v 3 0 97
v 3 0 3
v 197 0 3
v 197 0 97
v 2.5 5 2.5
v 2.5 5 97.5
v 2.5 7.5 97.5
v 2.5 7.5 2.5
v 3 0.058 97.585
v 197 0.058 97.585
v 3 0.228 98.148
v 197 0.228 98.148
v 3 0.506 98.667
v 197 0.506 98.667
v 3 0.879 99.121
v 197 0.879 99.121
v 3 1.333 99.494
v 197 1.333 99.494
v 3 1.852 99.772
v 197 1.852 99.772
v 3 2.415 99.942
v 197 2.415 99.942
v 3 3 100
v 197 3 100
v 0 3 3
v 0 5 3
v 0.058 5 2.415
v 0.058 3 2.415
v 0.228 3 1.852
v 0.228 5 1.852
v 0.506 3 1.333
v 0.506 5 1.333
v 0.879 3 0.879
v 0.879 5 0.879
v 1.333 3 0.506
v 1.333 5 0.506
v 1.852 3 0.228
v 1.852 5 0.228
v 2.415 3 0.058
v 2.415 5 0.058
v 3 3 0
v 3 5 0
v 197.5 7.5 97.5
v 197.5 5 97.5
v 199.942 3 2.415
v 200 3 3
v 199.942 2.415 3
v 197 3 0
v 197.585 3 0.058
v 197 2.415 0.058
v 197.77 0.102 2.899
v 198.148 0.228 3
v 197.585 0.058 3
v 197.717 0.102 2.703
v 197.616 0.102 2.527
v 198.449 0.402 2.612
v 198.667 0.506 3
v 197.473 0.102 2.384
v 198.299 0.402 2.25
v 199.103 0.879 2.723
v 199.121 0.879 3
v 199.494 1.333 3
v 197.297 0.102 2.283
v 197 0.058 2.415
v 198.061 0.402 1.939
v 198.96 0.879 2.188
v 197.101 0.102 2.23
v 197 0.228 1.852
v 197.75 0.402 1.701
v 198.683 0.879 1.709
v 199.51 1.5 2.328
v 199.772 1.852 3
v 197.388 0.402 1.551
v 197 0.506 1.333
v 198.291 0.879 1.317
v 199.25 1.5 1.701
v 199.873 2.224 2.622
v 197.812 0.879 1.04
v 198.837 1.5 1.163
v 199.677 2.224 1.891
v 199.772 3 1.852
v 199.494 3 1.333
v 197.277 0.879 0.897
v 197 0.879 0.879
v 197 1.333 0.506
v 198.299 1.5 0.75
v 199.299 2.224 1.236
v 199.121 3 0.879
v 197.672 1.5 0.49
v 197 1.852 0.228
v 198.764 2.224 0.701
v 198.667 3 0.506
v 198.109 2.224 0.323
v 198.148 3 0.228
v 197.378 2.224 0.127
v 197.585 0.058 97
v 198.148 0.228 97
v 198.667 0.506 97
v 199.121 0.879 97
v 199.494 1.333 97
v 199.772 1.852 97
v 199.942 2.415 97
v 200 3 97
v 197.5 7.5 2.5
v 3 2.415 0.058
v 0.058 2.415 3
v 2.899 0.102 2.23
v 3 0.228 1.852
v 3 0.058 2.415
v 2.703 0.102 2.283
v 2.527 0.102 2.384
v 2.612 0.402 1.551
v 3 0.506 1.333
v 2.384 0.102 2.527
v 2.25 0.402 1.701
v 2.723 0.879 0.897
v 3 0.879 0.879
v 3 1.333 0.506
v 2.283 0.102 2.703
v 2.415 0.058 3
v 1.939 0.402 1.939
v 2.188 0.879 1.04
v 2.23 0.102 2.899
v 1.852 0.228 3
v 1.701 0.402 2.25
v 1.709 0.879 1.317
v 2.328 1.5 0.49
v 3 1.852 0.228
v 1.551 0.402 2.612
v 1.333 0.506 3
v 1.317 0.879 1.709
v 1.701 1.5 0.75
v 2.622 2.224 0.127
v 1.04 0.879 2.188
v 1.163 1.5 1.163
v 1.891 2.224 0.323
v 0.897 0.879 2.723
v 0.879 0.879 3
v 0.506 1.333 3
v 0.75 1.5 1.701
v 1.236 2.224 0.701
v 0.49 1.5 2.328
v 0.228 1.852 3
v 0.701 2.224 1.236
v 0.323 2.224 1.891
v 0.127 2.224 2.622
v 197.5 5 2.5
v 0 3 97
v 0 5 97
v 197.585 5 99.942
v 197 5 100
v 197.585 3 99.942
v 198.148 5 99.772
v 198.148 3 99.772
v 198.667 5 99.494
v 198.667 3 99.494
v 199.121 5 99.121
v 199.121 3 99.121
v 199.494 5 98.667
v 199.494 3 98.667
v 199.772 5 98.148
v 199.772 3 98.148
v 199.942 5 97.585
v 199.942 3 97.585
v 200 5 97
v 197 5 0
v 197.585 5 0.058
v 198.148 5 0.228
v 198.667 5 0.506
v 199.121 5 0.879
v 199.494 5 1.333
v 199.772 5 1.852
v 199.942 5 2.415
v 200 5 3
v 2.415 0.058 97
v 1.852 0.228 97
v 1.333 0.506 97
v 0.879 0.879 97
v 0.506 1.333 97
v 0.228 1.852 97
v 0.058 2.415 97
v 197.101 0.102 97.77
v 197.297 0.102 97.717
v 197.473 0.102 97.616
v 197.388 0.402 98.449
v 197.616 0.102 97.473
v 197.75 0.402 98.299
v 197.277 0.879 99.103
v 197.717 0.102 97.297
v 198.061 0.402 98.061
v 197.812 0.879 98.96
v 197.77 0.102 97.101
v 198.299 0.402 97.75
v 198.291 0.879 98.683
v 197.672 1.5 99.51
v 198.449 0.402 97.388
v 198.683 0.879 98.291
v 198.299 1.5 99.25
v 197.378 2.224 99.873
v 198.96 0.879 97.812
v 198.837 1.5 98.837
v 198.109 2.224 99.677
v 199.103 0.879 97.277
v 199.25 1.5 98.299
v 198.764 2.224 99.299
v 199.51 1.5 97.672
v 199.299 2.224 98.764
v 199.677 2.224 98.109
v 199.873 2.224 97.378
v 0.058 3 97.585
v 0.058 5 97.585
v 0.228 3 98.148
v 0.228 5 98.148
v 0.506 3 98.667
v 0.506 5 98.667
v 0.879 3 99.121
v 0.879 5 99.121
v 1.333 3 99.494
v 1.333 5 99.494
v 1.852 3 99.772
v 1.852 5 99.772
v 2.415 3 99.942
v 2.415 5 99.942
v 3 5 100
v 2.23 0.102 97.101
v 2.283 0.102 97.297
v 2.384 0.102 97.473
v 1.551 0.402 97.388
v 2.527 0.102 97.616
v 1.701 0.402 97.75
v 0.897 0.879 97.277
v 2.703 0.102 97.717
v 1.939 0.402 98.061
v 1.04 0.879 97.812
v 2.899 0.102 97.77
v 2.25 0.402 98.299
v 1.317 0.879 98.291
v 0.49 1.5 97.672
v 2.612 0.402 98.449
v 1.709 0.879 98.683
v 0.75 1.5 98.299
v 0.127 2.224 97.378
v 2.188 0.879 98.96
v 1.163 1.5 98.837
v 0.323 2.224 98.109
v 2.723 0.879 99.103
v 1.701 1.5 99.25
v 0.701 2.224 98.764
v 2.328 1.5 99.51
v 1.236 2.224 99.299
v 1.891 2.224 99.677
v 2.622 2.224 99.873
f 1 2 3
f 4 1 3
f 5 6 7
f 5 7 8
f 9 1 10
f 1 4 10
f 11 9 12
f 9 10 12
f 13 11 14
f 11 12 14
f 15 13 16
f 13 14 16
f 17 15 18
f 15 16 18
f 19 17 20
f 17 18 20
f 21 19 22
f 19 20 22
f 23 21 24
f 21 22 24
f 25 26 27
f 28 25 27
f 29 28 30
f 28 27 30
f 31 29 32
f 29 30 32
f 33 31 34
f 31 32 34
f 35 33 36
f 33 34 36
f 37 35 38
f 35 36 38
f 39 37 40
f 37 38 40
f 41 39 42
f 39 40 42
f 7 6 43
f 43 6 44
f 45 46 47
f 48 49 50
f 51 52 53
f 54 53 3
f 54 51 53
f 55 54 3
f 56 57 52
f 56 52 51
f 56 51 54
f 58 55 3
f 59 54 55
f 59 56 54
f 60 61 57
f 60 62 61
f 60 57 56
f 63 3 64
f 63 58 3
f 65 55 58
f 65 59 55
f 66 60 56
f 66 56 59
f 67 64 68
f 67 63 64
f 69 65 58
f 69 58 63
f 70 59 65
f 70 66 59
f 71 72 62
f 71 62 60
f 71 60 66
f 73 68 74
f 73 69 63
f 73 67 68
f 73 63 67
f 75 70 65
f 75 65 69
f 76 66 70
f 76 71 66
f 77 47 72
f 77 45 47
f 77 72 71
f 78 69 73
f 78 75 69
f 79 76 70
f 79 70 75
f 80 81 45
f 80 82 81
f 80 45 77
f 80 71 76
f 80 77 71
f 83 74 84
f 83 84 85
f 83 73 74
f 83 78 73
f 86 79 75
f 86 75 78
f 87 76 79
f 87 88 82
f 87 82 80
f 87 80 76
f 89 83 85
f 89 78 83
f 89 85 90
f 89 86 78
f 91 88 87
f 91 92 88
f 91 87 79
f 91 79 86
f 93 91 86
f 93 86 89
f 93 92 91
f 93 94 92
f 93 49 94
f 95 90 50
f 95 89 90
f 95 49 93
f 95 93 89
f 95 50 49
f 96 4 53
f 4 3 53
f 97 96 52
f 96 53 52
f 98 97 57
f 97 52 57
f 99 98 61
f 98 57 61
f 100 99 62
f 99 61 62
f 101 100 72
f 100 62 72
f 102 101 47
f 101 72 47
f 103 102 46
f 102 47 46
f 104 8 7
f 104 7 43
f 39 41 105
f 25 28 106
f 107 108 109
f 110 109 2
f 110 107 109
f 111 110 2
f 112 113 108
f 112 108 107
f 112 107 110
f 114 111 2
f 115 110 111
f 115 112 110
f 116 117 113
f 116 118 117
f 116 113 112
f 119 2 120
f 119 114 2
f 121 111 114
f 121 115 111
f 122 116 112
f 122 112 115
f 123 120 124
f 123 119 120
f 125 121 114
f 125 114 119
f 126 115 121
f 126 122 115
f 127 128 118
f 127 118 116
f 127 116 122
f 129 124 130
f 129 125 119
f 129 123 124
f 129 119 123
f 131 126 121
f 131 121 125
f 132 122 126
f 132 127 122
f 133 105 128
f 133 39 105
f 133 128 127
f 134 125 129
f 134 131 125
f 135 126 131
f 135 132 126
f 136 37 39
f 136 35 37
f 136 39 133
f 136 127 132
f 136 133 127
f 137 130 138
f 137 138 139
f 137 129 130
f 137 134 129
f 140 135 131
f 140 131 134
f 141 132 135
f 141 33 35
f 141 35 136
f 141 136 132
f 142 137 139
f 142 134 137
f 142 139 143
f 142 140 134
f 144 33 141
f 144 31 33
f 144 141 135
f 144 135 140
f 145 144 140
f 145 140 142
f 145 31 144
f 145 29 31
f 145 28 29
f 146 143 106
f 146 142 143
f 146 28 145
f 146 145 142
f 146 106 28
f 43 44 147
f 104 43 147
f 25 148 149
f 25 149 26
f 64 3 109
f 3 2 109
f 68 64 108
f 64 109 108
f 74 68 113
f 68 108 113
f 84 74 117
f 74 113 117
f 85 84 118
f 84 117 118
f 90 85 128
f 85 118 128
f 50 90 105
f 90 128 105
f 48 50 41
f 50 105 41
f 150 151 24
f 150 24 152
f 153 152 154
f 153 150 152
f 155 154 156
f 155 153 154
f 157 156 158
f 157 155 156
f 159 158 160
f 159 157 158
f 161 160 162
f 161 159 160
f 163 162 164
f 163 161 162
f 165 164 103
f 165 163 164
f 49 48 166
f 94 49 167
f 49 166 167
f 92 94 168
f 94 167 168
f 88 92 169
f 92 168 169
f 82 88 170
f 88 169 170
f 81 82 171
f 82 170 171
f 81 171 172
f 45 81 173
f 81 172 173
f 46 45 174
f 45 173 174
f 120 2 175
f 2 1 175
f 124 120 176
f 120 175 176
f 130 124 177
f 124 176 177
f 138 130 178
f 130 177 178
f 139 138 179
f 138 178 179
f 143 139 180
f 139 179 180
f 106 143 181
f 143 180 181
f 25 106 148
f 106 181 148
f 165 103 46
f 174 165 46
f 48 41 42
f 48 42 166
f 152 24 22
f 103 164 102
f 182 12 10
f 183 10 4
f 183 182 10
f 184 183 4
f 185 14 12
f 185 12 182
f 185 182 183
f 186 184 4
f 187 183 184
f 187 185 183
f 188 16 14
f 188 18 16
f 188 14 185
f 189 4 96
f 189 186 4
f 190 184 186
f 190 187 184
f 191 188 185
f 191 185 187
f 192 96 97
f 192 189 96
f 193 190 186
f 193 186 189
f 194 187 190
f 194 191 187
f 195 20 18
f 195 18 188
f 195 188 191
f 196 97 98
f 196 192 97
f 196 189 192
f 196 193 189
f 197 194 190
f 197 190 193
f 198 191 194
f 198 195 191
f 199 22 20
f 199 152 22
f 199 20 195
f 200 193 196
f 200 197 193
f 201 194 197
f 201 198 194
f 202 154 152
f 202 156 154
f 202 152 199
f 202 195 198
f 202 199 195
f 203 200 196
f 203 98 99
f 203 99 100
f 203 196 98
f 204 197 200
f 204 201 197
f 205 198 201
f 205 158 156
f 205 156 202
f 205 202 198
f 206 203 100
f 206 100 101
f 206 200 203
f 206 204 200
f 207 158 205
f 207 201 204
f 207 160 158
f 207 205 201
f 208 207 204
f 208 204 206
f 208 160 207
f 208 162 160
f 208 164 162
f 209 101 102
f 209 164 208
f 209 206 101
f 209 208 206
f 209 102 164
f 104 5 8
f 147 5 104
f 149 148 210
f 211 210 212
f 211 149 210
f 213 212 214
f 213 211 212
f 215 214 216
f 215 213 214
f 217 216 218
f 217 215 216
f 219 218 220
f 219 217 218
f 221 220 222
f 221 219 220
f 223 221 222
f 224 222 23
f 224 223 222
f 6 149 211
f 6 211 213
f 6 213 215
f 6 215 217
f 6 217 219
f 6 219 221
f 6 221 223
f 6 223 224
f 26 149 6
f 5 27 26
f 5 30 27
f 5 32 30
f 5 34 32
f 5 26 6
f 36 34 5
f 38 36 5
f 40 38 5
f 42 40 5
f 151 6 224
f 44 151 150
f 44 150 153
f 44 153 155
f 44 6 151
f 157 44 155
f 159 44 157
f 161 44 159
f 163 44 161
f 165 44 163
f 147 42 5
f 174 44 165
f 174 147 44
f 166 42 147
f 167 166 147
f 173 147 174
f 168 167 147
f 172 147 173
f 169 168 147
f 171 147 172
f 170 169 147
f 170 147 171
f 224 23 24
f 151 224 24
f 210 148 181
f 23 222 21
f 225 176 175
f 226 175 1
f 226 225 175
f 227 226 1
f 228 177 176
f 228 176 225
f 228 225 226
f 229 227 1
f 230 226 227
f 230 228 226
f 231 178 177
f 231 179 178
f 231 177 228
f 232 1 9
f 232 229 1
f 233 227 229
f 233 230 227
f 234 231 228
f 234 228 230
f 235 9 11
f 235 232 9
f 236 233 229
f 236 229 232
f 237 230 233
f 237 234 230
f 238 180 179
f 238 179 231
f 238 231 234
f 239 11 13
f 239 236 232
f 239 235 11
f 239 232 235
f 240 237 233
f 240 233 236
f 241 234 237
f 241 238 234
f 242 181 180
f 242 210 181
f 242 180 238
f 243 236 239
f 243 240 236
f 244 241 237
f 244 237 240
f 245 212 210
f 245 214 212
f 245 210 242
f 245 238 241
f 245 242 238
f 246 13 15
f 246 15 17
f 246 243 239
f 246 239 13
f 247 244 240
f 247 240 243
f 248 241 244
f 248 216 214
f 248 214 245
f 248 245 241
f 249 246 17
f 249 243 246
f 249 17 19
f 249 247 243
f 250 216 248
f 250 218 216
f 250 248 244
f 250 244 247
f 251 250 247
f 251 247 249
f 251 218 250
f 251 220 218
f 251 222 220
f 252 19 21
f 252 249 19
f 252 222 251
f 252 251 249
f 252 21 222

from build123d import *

# Parameters (mm, degrees)
SKETCH1_W           = 200
SKETCH1_H           = 100
BOSS_EXTRUDE1_DEPTH = 5
SKETCH2_W           = 195
SKETCH2_H           = 95
BOSS_EXTRUDE2_DEPTH = 2.5
FILLET1_R           = 3
FILLET2_R           = 3


with BuildPart() as part:
    # Sketch1 → Boss-Extrude1 (new body)
    with BuildSketch(Plane(origin=(0, 0, 0), x_dir=(1, 0, 0), z_dir=(0, 1, 0))):
        with Locations((100, -50)):
            Rectangle(SKETCH1_W, SKETCH1_H)
    extrude(amount=BOSS_EXTRUDE1_DEPTH)

    # Sketch2 → Boss-Extrude2 (add)
    with BuildSketch(Plane(origin=(0, 5, 0), x_dir=(1, 0, 0), z_dir=(0, 1, 0))):
        with Locations((100, -50)):
            Rectangle(SKETCH2_W, SKETCH2_H)
    extrude(amount=BOSS_EXTRUDE2_DEPTH)

    # Fillet1
    fillet1_edges = [part.edges().sort_by_distance(p)[0] for p in [
        (0, 2.5, 0),
        (200, 2.5, 0),
        (200, 2.5, 100),
        (0, 2.5, 100),
    ]]
    fillet(fillet1_edges, radius=FILLET1_R)

    # Fillet2
    fillet2_edges = [part.edges().sort_by_distance(p)[0] for p in [
        (200, 0, 50),
        (0, 0, 50),
        (100, 0, 0),
        (100, 0, 100),
        (0.878679656, 0, 99.121320344),
        (0.878679656, 0, 0.878679656),
        (199.121320344, 0, 0.878679656),
        (199.121320344, 0, 99.121320344),
    ]]
    fillet(fillet2_edges, radius=FILLET2_R)


solid = part.part
